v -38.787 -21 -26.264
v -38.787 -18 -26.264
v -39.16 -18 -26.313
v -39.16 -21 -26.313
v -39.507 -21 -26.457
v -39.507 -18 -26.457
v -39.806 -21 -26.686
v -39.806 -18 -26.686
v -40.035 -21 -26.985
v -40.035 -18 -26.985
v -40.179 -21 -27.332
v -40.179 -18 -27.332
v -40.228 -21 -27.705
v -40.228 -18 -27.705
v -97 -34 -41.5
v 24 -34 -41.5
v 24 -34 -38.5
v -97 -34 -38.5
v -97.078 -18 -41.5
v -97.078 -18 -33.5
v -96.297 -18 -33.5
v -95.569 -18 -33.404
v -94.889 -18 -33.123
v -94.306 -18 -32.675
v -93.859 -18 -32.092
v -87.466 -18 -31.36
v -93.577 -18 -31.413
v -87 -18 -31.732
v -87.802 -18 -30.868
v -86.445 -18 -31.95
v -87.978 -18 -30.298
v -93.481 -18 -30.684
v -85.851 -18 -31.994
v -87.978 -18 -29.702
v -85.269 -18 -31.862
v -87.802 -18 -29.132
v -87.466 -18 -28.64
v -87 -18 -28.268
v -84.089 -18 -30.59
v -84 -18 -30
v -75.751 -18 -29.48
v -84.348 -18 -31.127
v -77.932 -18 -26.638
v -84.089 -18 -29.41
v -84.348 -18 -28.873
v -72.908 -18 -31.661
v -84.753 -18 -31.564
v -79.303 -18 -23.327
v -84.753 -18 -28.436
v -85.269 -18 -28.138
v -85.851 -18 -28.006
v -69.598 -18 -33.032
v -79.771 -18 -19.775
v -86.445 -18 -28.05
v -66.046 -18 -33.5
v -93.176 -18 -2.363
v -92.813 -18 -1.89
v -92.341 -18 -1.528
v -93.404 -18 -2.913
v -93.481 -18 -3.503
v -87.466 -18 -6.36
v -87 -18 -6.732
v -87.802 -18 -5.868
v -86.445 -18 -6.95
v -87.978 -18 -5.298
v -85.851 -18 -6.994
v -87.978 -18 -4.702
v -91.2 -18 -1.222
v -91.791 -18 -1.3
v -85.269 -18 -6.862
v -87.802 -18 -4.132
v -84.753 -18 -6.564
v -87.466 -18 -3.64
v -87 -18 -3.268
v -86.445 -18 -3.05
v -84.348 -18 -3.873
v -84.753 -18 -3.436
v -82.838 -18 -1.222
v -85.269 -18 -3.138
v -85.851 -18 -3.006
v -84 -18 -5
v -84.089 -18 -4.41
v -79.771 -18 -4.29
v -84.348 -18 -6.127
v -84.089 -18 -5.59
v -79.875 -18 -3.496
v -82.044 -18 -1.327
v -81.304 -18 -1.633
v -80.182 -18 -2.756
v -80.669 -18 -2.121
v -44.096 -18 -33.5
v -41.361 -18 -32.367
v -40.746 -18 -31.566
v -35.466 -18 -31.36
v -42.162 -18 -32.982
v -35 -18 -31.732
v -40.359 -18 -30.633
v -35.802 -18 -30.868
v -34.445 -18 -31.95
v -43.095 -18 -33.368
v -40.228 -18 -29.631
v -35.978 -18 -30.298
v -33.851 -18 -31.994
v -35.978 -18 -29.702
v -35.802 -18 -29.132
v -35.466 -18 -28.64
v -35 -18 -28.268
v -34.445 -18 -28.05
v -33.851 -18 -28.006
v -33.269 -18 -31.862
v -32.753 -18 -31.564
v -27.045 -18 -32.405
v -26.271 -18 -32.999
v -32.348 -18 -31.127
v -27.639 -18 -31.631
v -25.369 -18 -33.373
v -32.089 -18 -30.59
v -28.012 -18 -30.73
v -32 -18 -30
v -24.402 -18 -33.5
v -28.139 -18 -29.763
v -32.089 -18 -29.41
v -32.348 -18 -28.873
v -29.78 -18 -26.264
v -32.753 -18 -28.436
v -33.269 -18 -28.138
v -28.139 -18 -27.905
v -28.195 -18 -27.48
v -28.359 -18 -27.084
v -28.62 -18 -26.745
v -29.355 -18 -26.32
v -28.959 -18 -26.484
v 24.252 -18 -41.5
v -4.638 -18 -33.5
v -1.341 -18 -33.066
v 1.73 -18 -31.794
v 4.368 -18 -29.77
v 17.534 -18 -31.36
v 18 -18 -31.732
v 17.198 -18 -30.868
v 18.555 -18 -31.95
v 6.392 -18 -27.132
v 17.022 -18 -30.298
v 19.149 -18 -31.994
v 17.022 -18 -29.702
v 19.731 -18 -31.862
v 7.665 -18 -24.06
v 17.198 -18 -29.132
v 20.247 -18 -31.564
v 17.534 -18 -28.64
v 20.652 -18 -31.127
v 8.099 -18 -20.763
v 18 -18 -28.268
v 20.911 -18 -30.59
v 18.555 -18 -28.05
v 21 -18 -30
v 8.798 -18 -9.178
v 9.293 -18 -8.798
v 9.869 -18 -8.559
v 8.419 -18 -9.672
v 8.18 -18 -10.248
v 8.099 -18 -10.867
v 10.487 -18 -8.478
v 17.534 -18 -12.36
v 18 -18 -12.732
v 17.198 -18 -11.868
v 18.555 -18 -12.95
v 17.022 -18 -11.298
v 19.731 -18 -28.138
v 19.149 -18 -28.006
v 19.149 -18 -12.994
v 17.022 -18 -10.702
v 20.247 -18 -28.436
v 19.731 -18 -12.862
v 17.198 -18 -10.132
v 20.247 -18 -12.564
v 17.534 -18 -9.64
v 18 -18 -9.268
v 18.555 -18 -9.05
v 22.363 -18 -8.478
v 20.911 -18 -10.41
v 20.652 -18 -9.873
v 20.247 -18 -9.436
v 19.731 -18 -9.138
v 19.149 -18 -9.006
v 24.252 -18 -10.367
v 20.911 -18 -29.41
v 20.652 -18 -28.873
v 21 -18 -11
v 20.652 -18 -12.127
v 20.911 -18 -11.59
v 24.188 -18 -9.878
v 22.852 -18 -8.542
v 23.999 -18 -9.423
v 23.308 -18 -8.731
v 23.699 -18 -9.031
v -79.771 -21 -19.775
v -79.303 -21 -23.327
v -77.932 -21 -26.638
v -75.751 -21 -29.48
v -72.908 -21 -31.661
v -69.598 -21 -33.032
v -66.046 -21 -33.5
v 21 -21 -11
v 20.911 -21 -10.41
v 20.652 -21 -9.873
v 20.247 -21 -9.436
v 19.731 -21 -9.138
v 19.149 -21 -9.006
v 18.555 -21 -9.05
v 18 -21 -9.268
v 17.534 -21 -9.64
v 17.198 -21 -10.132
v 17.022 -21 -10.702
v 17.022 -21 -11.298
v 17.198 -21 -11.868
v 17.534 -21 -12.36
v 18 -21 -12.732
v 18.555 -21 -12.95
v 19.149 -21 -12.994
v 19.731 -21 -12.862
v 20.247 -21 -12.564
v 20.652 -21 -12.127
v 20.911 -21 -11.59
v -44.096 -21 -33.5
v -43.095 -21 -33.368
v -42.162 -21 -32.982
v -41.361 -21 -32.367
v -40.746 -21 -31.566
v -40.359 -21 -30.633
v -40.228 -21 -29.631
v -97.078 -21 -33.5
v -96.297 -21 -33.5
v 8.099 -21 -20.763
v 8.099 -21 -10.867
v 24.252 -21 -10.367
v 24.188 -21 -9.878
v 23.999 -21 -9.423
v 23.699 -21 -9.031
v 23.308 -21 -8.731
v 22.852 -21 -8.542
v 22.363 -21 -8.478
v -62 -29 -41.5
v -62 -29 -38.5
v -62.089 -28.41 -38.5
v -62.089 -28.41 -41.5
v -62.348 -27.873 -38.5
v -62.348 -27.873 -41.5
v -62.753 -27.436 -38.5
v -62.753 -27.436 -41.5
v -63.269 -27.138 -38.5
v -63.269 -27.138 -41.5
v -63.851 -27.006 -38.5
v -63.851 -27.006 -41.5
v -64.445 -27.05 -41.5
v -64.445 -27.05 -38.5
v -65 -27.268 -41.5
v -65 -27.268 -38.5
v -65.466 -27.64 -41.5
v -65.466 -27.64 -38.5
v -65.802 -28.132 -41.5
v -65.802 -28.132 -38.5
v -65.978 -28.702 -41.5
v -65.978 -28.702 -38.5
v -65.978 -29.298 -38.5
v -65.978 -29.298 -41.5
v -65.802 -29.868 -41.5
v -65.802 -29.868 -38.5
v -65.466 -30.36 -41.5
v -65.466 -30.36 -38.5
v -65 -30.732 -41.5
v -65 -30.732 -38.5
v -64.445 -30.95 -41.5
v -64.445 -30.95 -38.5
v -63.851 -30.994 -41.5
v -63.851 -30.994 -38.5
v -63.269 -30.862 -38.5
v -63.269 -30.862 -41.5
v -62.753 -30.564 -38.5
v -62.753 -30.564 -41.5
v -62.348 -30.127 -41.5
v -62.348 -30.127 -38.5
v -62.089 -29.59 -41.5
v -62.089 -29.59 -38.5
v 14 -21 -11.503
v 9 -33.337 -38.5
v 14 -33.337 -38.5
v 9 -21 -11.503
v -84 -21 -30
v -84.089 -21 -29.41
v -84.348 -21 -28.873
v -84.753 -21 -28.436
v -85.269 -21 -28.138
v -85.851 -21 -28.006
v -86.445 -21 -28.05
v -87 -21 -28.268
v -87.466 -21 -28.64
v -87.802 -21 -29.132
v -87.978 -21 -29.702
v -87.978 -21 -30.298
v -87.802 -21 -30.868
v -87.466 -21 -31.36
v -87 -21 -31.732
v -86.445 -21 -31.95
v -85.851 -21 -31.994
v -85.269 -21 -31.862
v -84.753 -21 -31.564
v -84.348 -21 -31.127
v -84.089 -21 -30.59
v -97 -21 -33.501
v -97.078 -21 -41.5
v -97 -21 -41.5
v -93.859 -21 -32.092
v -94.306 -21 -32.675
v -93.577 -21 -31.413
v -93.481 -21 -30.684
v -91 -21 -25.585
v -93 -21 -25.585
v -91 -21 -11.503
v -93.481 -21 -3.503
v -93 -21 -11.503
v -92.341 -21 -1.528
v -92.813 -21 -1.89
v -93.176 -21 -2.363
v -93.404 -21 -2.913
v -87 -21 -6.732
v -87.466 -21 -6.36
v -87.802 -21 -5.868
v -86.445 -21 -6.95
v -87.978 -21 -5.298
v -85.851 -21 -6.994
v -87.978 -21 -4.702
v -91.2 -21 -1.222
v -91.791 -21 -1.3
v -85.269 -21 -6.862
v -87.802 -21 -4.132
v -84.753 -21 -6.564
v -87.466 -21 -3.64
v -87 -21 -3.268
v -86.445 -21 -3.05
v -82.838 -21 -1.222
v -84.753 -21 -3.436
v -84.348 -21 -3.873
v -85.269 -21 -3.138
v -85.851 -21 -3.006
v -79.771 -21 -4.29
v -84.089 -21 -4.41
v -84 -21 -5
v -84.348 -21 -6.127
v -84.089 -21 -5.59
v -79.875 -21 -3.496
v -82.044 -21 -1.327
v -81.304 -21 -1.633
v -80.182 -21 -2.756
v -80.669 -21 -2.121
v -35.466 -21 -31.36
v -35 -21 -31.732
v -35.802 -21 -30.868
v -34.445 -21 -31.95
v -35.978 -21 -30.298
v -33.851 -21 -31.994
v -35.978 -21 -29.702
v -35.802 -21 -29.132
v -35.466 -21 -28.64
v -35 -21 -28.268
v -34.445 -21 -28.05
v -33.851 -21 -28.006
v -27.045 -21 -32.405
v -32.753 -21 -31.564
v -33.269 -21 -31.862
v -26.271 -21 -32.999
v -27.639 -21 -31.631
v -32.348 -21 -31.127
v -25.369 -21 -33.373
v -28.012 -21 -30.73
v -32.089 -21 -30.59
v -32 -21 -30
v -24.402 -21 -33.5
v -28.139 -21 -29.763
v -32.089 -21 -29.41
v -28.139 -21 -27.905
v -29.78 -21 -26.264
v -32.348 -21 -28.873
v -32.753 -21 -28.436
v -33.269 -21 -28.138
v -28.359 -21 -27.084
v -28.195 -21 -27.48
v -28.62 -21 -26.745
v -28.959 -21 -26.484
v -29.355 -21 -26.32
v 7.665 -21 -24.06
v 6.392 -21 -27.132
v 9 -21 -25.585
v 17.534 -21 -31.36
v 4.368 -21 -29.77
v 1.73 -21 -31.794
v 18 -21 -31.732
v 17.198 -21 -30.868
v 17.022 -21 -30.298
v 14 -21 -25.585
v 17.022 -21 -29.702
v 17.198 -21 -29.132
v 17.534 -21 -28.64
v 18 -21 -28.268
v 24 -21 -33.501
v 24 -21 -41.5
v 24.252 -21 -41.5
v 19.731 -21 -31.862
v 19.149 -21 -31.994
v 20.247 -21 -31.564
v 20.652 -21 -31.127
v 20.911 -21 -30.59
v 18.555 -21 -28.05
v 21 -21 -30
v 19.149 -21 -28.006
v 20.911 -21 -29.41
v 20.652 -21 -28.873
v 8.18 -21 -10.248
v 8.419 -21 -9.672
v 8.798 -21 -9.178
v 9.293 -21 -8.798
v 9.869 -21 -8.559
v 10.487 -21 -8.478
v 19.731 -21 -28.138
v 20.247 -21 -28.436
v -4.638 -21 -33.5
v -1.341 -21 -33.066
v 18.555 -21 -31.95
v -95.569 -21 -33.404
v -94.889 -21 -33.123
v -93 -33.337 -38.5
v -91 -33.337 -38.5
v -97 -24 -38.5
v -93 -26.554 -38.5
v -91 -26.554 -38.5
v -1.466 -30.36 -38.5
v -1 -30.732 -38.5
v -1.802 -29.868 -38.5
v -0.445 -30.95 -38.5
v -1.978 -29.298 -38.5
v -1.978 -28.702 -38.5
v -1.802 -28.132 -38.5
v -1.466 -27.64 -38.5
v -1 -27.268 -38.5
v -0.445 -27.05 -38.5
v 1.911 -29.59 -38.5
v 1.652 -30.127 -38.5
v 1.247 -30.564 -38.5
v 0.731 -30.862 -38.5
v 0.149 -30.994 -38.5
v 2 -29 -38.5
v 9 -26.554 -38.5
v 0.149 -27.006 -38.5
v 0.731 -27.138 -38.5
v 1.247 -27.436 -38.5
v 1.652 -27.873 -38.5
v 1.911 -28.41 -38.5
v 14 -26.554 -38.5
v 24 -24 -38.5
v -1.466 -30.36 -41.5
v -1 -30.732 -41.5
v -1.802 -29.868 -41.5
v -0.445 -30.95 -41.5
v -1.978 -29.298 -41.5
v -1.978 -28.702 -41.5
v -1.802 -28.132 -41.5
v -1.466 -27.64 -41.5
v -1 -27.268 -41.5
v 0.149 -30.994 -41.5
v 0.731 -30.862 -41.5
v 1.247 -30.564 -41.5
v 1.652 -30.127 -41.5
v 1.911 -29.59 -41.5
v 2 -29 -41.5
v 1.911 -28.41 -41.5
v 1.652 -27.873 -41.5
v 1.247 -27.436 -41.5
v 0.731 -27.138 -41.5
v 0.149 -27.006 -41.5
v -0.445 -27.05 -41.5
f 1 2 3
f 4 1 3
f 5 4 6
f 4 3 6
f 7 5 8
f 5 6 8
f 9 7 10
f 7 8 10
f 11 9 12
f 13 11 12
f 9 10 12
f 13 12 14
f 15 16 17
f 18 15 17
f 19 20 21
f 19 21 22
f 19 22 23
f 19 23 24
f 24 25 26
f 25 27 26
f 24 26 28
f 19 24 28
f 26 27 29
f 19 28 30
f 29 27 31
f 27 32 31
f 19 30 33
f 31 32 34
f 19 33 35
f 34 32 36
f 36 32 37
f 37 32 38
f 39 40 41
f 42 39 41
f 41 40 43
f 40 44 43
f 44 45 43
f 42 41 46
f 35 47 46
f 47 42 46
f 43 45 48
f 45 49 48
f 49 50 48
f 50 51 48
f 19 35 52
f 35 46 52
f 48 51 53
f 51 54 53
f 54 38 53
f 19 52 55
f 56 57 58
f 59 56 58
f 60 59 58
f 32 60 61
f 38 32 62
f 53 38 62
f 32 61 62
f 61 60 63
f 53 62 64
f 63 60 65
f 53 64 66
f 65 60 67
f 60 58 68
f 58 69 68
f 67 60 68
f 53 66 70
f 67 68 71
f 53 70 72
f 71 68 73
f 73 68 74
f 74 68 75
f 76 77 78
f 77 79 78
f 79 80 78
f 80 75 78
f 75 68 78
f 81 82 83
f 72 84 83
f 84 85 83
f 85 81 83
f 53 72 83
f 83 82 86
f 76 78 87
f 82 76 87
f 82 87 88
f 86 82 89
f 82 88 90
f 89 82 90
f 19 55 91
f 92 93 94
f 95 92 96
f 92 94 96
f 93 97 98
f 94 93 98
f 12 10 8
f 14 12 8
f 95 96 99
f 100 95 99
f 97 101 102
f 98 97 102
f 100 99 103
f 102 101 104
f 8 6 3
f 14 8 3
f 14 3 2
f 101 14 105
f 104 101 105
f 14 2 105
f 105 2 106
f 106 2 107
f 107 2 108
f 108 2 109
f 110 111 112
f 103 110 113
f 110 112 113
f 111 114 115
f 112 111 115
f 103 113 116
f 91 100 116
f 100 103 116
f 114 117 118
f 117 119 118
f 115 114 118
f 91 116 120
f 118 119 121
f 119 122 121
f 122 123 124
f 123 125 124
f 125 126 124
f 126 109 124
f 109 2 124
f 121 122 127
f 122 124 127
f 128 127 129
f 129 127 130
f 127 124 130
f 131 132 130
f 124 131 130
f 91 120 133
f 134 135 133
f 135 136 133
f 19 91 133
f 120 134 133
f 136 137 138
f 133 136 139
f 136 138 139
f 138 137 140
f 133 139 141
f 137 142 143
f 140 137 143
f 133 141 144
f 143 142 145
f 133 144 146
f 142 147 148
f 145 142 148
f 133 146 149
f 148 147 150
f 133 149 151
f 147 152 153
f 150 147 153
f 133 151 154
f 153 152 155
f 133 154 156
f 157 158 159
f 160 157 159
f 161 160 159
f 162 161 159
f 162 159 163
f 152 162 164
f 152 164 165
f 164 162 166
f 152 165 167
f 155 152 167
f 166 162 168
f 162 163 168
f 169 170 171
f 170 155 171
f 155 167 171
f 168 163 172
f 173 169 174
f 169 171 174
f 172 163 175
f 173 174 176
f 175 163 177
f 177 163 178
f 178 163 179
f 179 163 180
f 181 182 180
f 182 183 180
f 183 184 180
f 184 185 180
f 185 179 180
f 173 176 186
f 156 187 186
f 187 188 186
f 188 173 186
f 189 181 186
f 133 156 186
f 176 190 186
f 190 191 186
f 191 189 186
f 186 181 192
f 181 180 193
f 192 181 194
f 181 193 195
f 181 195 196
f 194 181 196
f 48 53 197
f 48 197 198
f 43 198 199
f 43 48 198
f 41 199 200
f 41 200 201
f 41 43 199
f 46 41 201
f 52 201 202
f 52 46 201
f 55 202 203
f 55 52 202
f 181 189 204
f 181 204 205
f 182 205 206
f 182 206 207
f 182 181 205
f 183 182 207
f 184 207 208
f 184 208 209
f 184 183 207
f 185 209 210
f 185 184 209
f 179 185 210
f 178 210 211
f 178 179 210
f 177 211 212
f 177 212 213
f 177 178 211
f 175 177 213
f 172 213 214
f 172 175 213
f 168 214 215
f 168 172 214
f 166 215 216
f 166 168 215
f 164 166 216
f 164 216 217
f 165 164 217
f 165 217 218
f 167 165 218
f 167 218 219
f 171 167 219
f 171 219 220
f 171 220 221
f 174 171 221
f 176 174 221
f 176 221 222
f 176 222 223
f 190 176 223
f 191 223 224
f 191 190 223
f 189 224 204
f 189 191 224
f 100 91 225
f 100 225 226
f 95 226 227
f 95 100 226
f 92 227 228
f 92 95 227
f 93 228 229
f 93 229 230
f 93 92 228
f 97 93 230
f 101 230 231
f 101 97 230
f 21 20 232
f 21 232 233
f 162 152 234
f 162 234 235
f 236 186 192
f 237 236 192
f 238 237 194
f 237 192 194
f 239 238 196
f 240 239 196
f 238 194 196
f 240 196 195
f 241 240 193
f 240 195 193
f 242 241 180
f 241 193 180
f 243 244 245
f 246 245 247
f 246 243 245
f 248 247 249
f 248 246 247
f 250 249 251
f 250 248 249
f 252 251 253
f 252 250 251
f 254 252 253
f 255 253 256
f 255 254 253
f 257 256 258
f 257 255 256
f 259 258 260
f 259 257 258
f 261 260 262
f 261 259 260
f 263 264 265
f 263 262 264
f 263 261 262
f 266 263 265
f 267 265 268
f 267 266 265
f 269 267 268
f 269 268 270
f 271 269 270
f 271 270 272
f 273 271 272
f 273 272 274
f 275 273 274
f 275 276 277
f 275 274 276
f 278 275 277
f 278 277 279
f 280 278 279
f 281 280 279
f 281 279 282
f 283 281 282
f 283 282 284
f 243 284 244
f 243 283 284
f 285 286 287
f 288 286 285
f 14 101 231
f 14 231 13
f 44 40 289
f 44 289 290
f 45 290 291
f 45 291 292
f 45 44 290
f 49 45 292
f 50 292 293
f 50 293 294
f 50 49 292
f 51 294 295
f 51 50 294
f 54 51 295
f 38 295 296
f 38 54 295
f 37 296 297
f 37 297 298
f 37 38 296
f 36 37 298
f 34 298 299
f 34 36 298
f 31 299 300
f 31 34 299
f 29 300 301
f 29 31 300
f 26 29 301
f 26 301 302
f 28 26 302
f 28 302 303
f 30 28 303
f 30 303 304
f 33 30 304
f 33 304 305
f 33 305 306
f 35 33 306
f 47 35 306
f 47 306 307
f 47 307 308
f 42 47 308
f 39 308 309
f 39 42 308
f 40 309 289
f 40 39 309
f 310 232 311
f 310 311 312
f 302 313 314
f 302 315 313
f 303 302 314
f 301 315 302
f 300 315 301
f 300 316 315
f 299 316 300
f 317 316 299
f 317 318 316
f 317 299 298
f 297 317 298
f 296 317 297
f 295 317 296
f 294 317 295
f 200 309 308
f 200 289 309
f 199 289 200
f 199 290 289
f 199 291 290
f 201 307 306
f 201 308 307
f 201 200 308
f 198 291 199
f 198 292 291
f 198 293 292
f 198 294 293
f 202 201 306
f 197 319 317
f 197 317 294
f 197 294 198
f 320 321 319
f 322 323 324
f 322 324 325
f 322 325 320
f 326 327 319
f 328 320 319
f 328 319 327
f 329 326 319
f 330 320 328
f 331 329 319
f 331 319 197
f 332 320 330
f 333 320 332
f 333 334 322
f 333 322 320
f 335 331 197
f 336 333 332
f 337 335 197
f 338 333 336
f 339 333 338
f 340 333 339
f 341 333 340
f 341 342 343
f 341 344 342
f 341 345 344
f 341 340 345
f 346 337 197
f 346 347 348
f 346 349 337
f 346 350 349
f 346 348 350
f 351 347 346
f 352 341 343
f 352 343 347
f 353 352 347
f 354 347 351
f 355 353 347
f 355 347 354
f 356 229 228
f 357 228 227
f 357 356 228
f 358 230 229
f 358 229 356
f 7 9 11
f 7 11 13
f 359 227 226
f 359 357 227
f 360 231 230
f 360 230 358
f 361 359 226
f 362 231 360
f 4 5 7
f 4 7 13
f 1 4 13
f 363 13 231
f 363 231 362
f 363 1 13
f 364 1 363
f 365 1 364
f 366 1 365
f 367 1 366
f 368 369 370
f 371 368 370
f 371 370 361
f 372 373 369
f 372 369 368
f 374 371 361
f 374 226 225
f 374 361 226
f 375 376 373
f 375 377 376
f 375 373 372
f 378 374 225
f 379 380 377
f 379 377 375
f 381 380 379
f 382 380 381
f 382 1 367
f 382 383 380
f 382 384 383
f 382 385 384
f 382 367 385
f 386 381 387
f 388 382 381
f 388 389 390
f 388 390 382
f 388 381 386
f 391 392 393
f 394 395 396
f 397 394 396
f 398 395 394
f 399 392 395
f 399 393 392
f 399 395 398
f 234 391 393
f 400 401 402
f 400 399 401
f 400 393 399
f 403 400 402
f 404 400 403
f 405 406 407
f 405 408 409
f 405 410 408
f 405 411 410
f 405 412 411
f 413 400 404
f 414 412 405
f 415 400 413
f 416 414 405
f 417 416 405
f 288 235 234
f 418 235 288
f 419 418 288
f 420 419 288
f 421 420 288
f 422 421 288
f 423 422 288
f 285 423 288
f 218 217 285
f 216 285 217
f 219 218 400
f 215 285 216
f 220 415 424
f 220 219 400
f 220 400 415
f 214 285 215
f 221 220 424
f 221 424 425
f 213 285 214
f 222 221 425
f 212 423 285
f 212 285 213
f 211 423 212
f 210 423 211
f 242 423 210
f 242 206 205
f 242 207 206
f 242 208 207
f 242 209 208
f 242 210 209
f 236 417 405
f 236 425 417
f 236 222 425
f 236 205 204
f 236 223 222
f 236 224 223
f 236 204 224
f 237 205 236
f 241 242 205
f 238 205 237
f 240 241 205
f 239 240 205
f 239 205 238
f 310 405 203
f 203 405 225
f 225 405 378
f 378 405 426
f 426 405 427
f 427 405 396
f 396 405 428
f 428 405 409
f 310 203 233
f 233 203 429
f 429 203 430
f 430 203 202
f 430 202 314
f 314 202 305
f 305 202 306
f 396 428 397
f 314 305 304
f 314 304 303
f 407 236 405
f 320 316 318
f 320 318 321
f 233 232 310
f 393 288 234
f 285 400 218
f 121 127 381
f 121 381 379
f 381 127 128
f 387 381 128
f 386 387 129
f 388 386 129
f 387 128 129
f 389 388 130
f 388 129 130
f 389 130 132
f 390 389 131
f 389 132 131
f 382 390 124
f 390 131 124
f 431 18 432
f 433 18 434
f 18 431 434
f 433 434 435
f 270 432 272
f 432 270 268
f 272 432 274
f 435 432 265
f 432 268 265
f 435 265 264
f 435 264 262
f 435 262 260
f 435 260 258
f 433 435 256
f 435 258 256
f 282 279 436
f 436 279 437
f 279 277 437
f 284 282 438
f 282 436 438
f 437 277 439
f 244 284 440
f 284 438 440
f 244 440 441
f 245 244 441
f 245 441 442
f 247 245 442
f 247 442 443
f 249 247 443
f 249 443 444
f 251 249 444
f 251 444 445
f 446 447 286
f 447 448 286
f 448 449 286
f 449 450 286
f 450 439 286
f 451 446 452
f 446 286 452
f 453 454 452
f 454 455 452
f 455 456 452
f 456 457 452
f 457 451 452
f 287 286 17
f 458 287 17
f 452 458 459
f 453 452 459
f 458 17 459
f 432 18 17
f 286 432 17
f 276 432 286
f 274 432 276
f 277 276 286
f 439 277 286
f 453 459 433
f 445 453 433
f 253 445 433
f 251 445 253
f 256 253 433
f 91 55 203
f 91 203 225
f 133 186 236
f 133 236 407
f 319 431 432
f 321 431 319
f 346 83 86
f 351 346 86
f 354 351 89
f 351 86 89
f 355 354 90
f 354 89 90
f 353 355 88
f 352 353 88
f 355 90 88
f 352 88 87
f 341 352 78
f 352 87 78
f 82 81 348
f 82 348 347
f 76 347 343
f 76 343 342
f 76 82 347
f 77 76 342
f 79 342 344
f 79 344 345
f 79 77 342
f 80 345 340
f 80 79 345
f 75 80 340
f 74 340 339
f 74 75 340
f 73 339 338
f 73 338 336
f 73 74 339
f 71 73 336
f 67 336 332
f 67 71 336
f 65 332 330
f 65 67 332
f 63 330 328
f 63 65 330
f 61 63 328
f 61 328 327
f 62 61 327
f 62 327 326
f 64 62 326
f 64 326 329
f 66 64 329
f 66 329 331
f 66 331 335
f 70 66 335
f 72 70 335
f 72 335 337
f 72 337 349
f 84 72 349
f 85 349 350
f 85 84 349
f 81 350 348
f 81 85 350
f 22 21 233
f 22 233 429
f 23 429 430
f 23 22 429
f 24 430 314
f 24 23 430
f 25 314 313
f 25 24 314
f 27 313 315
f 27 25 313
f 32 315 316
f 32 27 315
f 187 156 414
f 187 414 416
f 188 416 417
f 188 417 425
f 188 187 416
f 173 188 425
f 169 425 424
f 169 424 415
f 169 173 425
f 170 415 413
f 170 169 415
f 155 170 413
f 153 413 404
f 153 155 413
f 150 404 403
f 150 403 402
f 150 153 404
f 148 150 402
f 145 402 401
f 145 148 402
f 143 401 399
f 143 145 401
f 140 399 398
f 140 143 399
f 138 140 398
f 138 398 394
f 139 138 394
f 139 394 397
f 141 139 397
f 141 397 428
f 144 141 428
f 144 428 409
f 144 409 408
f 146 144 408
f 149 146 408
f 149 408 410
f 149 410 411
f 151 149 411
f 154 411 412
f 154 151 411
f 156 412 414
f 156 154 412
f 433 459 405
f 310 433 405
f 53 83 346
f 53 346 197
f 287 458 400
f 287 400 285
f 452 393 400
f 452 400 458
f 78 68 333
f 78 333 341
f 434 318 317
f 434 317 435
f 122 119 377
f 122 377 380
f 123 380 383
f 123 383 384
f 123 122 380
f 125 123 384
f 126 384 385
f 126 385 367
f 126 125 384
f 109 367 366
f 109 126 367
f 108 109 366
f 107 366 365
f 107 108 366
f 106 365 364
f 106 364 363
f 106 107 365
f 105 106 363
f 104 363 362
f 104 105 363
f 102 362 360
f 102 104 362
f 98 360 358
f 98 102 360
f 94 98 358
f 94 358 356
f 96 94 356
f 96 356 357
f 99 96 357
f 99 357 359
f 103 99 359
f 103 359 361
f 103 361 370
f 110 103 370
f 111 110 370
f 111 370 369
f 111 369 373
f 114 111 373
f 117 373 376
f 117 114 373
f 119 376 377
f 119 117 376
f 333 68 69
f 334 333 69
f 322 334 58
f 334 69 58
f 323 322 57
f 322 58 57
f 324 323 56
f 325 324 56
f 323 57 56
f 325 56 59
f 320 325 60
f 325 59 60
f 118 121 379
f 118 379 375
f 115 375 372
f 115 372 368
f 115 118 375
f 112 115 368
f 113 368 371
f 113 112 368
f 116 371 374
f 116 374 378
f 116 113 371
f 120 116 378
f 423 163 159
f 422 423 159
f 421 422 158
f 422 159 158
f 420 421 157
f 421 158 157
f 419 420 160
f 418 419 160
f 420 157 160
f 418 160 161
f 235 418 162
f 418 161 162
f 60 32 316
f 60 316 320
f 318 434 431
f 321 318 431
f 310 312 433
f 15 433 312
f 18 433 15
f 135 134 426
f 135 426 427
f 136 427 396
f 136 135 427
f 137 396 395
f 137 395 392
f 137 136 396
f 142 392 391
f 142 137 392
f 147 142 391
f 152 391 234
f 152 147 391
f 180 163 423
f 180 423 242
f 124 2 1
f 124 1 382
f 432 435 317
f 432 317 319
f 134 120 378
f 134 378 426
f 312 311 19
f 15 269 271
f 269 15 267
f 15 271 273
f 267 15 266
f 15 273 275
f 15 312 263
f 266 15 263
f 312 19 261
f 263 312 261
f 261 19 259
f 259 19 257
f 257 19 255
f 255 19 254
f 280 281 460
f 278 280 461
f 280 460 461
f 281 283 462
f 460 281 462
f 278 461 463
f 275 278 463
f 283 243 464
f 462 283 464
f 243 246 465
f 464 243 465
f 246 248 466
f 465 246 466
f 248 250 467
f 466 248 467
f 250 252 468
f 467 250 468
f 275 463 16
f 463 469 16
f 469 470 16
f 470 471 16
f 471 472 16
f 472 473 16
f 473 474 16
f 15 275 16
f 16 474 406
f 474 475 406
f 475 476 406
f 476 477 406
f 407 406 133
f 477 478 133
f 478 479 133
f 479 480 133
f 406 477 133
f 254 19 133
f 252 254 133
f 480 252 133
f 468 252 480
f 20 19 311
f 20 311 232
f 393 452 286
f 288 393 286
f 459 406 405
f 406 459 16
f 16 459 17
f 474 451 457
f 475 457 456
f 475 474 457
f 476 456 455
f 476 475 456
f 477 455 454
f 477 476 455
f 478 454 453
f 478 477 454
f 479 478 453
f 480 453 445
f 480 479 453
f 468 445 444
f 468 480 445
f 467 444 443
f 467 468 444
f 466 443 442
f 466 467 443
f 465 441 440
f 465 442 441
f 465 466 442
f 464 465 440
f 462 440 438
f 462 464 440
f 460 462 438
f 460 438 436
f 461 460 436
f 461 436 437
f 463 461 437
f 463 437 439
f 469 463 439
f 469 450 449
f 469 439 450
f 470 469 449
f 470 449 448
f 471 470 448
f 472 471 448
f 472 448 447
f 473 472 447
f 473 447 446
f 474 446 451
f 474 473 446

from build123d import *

# Parameters (mm, degrees)
SKETCH046_R     = 2
PAD031_DEPTH    = 3
PAD032_DEPTH    = 121
SKETCH048_R     = 2
POCKET006_DEPTH = 5
PAD034_DEPTH    = 5
PAD035_DEPTH    = 2


with BuildPart() as part:
    # Sketch046 → Pad031 (new body)
    with BuildSketch(Plane.XZ):
        with BuildLine():
            Line((-97.078247, 0), (24.252445, 0))
            Line((24.252445, 31.132916), (24.252445, 0))
            ThreePointArc((24.252445, 31.132916), (23.699133, 32.468728), (22.363321, 33.02204))
            Line((10.487469, 33.02204), (22.363321, 33.02204))
            ThreePointArc((10.487469, 33.02204), (8.798373, 32.322393), (8.098726, 30.633297))
            Line((8.098726, 20.736529), (8.098726, 30.633297))
            ThreePointArc((-4.637803, 8), (4.368283, 11.730443), (8.098726, 20.736529))
            Line((-24.402262, 8), (-4.637803, 8))
            ThreePointArc((-28.139309, 11.737048), (-27.044753, 9.094556), (-24.402262, 8))
            Line((-28.139309, 13.595442), (-28.139309, 11.737048))
            ThreePointArc((-28.139309, 13.595442), (-28.619727, 14.755273), (-29.779558, 15.235691))
            Line((-38.786943, 15.235691), (-29.779558, 15.235691))
            ThreePointArc((-38.786943, 15.235691), (-39.805693, 14.813711), (-40.227672, 13.794961))
            Line((-40.227672, 11.868778), (-40.227672, 13.794961))
            ThreePointArc((-44.096451, 8), (-41.360811, 9.133139), (-40.227672, 11.868778))
            Line((-66.045778, 8), (-44.096451, 8))
            ThreePointArc((-79.770671, 21.724892), (-75.750743, 12.019928), (-66.045778, 8))
            Line((-79.770671, 37.210011), (-79.770671, 21.724892))
            ThreePointArc((-79.770671, 37.210011), (-80.669155, 39.379145), (-82.838289, 40.277629))
            Line((-91.200258, 40.277629), (-82.838289, 40.277629))
            ThreePointArc((-91.200258, 40.277629), (-92.81323, 39.609514), (-93.481345, 37.996542))
            Line((-93.481345, 10.816122), (-93.481345, 37.996542))
            ThreePointArc((-96.297467, 8), (-94.306168, 8.824823), (-93.481345, 10.816122))
            Line((-97.078247, 8), (-96.297467, 8))
            Line((-97.078247, 0), (-97.078247, 8))
        make_face()
        with Locations((-86, 36.5)):
            Circle(SKETCH046_R, mode=Mode.SUBTRACT)
        with Locations((-86, 11.5)):
            Circle(SKETCH046_R, mode=Mode.SUBTRACT)
        with Locations((-34, 11.5)):
            Circle(SKETCH046_R, mode=Mode.SUBTRACT)
        with Locations((19, 30.5)):
            Circle(SKETCH046_R, mode=Mode.SUBTRACT)
        with Locations((19, 11.5)):
            Circle(SKETCH046_R, mode=Mode.SUBTRACT)
    extrude(amount=PAD031_DEPTH)

    # Sketch047 → Pad032 (join)
    with BuildSketch(Plane.YZ.offset(24)):
        Polygon((-3, 0), (-16, 0), (-16, 3), (-6, 3), (-3, 7.999382), align=None)
    extrude(amount=-PAD032_DEPTH)

    # Sketch048 → Pocket006 (cut)
    with BuildSketch(Plane.XY):
        with Locations((-64, -11)):
            Circle(SKETCH048_R)
        with Locations((0, -11)):
            Circle(SKETCH048_R)
    extrude(amount=POCKET006_DEPTH, mode=Mode.SUBTRACT)

    # Sketch054 → Pad034 (join)
    with BuildSketch(Plane.YZ.offset(9)):
        Polygon((-2.747999, 30.548568), (-2.747999, 16.500504), (-8.678396, 2.710541), (-15.46899, 2.710541), align=None)
    extrude(amount=PAD034_DEPTH)

    # Sketch055 → Pad035 (join)
    with BuildSketch(Plane.YZ.offset(-93)):
        Polygon((-2.747999, 30.548568), (-2.747999, 16.500504), (-8.678396, 2.710541), (-15.46899, 2.710541), align=None)
    extrude(amount=PAD035_DEPTH)


with BuildPart() as part_1:
    # Body011 placement: moved
    add(part.part.moved(Location((0, -18, -41.5))))


solid = part_1.part
